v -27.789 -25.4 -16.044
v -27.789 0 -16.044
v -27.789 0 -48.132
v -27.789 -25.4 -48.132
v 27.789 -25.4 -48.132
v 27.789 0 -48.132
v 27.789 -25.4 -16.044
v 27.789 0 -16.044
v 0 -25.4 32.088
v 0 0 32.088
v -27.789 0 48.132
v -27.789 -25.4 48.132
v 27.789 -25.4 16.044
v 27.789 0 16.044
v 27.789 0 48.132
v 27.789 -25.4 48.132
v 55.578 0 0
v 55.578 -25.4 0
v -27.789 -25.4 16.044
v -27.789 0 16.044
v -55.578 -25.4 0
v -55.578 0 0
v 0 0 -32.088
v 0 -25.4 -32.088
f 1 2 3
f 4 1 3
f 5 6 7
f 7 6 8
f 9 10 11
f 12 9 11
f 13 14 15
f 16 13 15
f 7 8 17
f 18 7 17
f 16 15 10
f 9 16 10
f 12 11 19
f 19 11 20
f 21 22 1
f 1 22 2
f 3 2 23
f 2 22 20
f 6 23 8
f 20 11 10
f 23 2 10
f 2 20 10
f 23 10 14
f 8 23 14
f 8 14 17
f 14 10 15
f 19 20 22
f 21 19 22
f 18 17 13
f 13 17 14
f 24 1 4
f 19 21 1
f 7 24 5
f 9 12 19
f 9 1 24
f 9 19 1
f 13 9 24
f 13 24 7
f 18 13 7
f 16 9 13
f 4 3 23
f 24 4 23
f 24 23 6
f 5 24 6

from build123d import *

# Parameters (mm, degrees)
F1_DEPTH = 25.4


with BuildPart() as f1:
    # F0 (on Front) → F1 (new body)
    with BuildSketch(Plane.XZ):
        Polygon((27.7888969147, 48.1317813425), (0, 32.0878542283), (27.7888969147, 16.0439271142), align=None)
        Polygon((27.7888969147, 16.0439271142), (0, 32.0878542283), (-27.7888969147, 16.0439271142), (-27.7888969147, -16.0439271142), (0, -32.0878542283), (27.7888969147, -16.0439271142), align=None)
        Polygon((-27.7888969147, 16.0439271142), (0, 32.0878542283), (-27.7888969147, 48.1317813425), align=None)
        Polygon((55.5777938294, 0), (27.7888969147, 16.0439271142), (27.7888969147, -16.0439271142), align=None)
        Polygon((-27.7888969147, -16.0439271142), (-27.7888969147, 16.0439271142), (-55.5777938294, 0), align=None)
        Polygon((27.7888969147, -48.1317813425), (27.7888969147, -16.0439271142), (0, -32.0878542283), align=None)
        Polygon((0, -32.0878542283), (-27.7888969147, -16.0439271142), (-27.7888969147, -48.1317813425), align=None)
    extrude(amount=F1_DEPTH)


solid = f1.part
